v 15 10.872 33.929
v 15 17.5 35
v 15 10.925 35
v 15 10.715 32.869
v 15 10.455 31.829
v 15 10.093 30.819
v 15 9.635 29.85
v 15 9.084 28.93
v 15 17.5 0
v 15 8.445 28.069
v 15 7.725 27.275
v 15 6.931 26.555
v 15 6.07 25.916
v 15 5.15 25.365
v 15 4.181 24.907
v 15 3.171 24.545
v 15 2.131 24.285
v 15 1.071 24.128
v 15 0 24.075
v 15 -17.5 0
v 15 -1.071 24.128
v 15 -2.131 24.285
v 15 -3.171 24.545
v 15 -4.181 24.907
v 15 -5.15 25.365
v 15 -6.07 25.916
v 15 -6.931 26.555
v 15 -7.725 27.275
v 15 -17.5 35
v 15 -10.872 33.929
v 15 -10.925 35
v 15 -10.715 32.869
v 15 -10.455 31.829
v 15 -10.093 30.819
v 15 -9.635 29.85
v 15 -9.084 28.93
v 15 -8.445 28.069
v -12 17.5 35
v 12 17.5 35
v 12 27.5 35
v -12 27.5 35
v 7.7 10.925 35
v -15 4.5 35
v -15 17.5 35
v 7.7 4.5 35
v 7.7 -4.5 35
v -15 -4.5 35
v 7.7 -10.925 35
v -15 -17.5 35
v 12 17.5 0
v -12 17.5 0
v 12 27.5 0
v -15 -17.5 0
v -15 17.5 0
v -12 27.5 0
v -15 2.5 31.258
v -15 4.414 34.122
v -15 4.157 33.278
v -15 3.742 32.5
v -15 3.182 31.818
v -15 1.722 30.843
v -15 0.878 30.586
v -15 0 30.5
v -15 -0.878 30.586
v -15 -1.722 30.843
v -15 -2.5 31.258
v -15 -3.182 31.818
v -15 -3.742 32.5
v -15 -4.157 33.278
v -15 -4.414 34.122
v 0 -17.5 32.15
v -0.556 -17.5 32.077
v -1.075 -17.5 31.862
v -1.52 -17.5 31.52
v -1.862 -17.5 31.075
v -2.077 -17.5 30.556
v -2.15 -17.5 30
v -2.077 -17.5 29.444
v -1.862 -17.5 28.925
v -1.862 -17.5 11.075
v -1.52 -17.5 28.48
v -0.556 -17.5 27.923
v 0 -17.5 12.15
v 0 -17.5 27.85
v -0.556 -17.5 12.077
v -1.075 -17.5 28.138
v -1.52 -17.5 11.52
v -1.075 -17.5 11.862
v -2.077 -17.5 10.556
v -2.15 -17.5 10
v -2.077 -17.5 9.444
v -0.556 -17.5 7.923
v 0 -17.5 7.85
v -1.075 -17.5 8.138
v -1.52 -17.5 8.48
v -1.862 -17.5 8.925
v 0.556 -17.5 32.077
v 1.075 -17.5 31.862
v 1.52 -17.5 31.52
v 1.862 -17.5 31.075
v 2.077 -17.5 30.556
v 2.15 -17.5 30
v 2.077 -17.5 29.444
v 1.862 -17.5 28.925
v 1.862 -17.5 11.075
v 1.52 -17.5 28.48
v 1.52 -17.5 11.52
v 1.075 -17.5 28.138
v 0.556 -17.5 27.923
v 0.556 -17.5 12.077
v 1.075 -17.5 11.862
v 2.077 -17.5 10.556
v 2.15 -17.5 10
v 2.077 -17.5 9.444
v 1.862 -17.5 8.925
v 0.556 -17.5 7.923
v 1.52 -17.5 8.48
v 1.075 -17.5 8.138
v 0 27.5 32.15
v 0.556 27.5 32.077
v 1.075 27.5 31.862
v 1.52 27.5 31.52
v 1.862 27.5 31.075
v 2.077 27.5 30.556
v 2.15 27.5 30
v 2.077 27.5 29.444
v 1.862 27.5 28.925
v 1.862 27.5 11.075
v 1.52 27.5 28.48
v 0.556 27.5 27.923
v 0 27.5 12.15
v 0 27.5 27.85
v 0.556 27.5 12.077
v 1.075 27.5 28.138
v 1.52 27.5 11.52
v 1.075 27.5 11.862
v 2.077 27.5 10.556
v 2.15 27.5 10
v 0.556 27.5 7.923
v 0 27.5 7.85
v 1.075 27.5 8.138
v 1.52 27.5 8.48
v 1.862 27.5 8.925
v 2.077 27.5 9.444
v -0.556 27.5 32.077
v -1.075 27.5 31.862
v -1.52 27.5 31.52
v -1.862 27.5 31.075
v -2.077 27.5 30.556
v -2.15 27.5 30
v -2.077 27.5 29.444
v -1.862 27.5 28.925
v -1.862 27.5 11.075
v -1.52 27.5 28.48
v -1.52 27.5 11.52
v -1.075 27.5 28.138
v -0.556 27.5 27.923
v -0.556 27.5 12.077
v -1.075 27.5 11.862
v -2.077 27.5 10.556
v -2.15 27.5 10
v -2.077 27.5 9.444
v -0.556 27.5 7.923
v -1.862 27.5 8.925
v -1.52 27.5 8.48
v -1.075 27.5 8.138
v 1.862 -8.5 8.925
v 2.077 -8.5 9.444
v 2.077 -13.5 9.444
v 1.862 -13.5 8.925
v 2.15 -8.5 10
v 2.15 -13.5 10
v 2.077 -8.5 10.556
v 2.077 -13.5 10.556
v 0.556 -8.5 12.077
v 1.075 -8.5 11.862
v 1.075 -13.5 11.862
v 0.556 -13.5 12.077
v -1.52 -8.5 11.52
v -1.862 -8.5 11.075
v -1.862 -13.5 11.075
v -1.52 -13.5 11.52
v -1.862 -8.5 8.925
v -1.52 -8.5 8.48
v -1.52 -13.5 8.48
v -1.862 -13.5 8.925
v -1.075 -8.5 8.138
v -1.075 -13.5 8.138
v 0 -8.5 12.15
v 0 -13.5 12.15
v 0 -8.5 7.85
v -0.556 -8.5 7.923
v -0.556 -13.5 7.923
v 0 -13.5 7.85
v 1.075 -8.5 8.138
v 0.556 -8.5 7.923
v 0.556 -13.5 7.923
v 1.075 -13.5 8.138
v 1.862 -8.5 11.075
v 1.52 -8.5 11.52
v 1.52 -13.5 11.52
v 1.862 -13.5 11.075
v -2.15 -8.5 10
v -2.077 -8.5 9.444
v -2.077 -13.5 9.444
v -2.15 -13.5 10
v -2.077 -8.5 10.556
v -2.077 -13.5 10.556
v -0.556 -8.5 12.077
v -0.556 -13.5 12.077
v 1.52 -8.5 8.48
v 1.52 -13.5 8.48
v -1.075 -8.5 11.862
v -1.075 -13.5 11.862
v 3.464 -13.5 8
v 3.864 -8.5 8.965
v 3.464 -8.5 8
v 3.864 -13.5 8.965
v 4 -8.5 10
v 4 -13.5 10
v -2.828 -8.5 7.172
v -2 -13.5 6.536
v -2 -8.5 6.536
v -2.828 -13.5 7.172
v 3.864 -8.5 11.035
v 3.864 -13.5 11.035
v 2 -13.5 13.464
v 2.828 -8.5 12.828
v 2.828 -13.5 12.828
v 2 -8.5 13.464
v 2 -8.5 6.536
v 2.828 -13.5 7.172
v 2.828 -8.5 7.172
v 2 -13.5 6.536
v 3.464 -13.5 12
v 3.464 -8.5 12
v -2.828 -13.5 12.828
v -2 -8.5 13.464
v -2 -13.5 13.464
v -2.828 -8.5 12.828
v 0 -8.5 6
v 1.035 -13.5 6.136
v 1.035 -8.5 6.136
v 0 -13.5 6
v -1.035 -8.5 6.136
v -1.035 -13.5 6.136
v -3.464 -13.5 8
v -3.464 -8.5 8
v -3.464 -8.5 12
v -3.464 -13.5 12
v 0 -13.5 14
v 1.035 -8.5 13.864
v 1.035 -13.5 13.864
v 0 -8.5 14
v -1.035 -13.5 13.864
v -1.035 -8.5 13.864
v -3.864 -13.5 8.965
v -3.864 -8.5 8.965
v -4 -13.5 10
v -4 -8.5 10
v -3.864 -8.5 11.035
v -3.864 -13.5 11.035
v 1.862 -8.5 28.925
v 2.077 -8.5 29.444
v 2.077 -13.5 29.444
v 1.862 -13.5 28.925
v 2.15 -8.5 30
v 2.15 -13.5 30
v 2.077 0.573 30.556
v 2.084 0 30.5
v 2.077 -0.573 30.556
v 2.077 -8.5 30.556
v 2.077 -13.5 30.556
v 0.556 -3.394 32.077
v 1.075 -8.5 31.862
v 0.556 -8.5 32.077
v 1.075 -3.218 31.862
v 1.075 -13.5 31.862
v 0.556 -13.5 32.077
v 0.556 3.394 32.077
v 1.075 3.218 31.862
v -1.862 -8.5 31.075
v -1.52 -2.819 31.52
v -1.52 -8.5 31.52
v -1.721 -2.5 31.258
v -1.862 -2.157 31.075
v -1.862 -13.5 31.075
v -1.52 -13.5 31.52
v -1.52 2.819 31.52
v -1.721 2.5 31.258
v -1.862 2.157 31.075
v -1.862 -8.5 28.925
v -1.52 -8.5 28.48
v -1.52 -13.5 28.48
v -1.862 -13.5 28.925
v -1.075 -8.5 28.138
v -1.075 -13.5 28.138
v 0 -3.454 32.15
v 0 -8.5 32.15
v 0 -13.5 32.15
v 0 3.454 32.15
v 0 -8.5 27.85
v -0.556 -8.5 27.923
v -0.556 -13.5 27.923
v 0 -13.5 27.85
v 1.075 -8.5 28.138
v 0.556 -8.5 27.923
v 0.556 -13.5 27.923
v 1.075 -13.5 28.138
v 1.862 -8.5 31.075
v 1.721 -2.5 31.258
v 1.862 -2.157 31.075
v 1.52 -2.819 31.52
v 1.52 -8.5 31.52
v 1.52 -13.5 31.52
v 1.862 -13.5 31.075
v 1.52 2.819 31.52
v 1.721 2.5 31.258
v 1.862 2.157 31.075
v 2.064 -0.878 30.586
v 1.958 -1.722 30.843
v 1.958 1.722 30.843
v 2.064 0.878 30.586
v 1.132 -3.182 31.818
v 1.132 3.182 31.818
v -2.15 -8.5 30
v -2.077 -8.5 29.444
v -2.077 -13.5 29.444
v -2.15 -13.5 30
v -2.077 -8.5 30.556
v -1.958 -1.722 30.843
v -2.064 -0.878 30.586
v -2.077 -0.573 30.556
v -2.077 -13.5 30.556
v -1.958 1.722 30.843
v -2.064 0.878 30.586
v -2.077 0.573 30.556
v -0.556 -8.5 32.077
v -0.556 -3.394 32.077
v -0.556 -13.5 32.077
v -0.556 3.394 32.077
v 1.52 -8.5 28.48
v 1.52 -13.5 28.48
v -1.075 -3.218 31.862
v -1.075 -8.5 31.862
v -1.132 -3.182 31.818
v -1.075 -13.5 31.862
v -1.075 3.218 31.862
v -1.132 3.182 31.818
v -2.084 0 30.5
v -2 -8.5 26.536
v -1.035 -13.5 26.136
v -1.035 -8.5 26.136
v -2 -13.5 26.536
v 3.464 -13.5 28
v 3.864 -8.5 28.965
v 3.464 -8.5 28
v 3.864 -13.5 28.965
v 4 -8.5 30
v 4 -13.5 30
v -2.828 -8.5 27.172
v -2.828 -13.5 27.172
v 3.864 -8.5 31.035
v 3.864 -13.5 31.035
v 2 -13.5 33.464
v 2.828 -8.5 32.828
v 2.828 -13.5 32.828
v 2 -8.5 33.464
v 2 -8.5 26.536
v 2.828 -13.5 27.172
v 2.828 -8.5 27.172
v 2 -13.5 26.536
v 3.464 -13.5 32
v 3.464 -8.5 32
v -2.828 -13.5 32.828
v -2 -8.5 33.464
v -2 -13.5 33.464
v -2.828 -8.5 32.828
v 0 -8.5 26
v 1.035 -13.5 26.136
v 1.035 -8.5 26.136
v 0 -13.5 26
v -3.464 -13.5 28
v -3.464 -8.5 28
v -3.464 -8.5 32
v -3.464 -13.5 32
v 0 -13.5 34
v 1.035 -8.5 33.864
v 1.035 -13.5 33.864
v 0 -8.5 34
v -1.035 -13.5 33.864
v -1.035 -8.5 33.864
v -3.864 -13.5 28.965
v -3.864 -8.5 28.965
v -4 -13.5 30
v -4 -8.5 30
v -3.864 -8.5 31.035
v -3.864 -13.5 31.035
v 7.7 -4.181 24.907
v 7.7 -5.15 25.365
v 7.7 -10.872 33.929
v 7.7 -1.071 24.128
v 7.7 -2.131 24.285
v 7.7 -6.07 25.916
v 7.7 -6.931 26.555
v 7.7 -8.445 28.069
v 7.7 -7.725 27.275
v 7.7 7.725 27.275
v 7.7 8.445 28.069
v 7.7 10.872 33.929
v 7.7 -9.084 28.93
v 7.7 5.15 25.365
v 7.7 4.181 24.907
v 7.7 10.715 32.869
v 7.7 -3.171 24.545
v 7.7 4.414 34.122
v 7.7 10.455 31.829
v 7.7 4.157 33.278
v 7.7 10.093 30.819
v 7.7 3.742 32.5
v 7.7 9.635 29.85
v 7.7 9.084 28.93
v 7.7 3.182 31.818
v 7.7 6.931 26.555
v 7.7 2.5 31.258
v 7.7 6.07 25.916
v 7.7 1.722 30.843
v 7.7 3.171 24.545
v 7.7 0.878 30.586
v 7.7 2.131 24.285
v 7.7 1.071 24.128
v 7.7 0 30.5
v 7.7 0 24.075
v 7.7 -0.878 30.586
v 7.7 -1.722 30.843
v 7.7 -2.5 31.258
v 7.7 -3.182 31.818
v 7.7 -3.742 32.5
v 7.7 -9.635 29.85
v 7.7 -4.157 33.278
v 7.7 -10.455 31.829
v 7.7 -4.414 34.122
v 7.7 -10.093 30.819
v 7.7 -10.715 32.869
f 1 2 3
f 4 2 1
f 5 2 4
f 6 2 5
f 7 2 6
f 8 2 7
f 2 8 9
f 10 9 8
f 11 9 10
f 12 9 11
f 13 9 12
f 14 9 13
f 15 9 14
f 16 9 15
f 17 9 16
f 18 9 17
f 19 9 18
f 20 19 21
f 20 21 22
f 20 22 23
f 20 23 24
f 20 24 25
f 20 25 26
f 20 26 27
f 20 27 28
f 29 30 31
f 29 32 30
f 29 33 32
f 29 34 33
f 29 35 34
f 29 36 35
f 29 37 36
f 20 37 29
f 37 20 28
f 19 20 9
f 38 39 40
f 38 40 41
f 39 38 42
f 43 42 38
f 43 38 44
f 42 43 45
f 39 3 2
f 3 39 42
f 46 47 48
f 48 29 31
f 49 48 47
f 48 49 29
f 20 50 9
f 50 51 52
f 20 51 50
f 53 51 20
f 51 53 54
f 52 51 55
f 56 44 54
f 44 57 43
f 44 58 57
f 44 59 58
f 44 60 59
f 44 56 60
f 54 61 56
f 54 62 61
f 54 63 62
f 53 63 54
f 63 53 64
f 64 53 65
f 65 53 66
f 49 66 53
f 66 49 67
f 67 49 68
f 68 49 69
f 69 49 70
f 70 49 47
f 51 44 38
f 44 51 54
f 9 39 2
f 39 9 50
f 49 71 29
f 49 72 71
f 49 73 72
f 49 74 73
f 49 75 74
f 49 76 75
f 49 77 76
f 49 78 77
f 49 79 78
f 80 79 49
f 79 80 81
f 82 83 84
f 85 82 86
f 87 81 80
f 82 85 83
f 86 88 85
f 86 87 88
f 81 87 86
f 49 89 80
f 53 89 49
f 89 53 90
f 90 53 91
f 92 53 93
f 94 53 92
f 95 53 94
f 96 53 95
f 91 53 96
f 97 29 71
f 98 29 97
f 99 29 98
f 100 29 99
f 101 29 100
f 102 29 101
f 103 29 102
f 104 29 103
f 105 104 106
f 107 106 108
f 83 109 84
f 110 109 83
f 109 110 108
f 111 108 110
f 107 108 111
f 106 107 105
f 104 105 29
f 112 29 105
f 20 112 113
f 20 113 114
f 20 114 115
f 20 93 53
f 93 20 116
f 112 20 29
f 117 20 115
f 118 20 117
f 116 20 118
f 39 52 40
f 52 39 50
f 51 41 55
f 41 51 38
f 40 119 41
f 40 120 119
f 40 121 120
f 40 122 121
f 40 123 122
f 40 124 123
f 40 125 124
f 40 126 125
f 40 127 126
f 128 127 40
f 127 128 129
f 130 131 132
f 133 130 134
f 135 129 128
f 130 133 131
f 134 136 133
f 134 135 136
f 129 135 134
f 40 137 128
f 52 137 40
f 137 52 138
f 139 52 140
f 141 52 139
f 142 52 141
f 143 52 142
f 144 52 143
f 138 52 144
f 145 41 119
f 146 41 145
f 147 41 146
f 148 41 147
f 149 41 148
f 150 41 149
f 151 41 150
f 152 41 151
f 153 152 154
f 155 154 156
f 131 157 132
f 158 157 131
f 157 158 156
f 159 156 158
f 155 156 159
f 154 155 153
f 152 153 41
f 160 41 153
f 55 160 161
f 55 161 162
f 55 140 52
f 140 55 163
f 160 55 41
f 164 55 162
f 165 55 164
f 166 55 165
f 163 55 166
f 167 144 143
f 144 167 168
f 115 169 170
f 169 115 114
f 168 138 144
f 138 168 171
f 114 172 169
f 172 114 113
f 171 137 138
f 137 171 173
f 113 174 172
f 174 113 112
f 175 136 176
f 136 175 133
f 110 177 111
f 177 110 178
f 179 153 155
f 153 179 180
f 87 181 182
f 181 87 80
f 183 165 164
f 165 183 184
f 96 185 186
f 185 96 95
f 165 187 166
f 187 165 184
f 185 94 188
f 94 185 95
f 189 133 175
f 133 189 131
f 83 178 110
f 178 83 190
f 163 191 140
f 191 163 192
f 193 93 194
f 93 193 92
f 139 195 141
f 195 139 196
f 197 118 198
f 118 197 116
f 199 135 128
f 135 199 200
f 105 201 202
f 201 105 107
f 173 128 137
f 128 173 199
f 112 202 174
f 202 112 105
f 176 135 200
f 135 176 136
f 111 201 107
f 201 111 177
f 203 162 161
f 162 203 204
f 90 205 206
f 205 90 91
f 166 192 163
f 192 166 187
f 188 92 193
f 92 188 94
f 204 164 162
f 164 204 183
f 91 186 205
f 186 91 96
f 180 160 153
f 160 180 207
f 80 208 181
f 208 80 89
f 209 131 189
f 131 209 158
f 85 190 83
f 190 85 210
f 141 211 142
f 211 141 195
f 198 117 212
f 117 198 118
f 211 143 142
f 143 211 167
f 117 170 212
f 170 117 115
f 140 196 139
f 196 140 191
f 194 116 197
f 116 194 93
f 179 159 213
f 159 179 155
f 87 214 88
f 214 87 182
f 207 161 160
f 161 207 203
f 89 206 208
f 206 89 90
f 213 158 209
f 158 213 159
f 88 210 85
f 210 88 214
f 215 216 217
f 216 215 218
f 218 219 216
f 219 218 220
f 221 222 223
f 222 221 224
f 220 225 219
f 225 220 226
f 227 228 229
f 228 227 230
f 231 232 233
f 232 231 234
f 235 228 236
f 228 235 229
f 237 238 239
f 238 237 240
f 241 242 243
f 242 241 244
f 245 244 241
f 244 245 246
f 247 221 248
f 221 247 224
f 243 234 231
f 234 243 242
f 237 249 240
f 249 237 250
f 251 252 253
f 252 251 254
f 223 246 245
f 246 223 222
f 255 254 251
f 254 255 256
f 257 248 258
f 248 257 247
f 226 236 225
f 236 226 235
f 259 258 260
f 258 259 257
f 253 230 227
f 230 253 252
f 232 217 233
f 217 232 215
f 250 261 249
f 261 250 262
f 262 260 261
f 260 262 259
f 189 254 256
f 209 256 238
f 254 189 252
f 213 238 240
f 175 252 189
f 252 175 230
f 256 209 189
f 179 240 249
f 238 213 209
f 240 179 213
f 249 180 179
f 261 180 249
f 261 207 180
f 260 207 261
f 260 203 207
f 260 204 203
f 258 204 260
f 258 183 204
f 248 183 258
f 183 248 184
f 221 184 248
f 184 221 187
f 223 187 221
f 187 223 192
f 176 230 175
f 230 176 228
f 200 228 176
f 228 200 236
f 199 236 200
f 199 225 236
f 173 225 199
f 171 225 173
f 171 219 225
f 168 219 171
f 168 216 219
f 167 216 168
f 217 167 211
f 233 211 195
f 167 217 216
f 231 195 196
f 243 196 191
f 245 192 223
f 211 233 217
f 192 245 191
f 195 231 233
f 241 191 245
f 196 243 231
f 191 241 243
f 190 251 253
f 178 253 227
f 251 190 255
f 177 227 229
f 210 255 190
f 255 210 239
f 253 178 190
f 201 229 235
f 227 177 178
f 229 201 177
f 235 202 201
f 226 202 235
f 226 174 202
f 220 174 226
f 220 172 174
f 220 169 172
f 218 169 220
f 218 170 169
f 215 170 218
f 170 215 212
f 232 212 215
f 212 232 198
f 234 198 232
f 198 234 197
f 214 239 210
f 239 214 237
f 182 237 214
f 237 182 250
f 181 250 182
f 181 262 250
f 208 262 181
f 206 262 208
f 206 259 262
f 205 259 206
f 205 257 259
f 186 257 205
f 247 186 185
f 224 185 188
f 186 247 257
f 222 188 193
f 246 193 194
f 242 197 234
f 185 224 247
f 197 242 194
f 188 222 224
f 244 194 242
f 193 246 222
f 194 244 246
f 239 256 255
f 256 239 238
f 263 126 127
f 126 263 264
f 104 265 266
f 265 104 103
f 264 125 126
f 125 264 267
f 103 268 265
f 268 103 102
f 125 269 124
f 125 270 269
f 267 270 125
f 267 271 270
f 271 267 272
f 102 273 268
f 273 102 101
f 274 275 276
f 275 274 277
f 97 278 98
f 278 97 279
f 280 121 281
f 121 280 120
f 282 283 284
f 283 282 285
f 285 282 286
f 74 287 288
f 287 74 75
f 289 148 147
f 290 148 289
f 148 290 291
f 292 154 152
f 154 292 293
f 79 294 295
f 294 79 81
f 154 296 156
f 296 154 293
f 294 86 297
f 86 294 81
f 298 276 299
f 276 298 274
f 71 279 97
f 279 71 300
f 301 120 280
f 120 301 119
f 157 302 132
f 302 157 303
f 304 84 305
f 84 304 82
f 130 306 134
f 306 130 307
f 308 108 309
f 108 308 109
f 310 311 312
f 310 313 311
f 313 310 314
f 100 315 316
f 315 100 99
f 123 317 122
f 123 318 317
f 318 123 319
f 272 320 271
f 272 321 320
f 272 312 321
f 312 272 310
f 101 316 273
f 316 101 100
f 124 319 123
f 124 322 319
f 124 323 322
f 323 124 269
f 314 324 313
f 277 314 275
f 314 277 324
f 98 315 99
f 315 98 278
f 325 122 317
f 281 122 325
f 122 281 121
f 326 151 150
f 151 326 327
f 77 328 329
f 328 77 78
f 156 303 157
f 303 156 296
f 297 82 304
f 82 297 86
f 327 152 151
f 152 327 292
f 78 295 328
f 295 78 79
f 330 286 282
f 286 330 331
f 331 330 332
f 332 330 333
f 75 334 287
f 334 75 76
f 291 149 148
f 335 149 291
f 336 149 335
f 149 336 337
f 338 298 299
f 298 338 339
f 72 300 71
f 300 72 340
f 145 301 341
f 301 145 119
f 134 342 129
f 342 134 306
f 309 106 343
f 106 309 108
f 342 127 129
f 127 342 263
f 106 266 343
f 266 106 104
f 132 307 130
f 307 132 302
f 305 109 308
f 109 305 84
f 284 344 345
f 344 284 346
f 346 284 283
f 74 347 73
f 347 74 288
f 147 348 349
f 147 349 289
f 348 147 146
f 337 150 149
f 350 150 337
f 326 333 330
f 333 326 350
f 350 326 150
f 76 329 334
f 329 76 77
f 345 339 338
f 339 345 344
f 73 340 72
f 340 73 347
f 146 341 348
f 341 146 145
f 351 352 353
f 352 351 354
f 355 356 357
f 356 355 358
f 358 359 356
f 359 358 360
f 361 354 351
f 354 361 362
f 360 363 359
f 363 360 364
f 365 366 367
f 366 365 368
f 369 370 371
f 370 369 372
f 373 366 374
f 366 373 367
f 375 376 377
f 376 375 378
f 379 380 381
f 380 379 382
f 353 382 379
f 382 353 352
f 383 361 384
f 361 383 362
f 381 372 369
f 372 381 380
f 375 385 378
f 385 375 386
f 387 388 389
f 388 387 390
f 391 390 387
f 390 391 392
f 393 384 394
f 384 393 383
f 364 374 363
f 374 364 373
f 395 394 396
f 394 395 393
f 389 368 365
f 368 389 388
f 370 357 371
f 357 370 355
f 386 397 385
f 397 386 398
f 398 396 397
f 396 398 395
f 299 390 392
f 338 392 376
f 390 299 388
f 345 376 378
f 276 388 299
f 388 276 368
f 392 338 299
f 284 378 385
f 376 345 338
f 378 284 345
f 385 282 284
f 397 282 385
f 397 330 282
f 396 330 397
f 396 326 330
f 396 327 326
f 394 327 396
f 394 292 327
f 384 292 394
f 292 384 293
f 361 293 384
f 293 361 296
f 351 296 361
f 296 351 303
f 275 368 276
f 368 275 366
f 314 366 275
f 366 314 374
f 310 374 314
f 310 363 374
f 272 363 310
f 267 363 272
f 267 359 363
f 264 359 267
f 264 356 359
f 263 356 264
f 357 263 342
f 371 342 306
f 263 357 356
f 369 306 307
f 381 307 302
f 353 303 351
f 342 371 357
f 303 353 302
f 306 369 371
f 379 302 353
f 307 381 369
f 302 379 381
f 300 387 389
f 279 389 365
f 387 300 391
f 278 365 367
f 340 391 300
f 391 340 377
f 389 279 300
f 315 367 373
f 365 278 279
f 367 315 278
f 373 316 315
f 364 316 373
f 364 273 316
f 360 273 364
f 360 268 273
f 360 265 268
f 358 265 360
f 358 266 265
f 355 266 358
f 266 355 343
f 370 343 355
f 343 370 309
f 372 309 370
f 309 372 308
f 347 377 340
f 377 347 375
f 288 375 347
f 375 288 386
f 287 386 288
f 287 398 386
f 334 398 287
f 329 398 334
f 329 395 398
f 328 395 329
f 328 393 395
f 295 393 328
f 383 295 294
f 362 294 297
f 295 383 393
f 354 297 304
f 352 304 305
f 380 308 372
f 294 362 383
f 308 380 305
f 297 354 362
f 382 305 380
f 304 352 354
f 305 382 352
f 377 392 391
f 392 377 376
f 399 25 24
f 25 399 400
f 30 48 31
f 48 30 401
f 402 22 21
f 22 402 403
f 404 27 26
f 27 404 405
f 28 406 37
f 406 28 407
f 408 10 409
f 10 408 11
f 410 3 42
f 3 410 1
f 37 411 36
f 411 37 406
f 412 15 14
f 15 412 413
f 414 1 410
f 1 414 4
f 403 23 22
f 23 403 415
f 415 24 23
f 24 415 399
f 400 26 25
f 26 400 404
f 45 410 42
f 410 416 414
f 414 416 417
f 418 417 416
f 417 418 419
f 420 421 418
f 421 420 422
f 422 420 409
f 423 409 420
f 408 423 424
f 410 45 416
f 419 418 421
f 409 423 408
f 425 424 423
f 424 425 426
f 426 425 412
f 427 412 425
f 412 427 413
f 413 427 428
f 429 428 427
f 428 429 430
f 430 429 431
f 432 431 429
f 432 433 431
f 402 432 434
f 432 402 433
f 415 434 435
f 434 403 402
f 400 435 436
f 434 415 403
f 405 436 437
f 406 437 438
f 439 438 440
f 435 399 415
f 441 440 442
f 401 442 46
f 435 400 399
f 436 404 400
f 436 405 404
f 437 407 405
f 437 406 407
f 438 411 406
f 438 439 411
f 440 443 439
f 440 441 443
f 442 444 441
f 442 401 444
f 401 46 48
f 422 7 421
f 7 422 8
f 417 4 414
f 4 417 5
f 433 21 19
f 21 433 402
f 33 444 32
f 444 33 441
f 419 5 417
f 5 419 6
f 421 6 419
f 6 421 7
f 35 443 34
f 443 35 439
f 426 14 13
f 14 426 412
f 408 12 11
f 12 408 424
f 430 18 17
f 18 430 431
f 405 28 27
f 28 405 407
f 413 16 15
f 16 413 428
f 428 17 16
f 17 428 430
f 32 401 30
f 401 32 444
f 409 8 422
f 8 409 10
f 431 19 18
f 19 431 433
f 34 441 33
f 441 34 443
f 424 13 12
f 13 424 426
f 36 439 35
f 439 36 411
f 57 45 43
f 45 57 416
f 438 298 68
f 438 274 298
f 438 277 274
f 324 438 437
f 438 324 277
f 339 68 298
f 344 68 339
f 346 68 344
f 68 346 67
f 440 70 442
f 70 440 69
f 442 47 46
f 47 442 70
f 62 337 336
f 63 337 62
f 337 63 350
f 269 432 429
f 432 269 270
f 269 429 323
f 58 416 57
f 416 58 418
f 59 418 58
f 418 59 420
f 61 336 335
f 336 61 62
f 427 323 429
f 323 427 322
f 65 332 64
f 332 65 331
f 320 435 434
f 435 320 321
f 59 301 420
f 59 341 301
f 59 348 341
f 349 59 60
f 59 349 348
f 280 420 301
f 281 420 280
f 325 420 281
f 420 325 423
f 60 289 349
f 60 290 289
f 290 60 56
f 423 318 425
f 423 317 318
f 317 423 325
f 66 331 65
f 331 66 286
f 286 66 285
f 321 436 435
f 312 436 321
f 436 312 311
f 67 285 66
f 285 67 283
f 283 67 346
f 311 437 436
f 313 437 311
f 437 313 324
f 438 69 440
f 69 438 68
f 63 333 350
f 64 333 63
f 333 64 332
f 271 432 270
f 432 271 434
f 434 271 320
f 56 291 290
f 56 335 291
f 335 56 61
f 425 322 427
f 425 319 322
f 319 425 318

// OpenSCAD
/*
 * BEARING BLOCK - 608 Bearing Mount
 *
 * Supports the cam shaft at each end.
 * Bearing pocket sized for press-fit of 608 bearing.
 *
 * Print: 2x (identical, mount mirrored)
 * Orientation: Upright
 */

include <../common.scad>

$fn = 48;

// ============================================
// MAIN BEARING BLOCK MODULE
// ============================================

module bearing_block() {
    difference() {
        union() {
            // Main block body
            block_body();

            // Mounting flange (toward backplate)
            mounting_flange();
        }

        // Bearing pocket (press fit)
        bearing_pocket();

        // Shaft through-hole
        shaft_hole();

        // Mounting screw holes
        mounting_holes();
    }
}

// ============================================
// BLOCK BODY
// ============================================

module block_body() {
    translate([-BB_WIDTH/2, -BB_DEPTH/2, 0])
        cube([BB_WIDTH, BB_DEPTH, BB_HEIGHT]);
}

// ============================================
// MOUNTING FLANGE
// ============================================

module mounting_flange() {
    flange_width = BB_WIDTH - 6;
    flange_depth = 12;

    translate([-flange_width/2, BB_DEPTH/2 - 2, 0])
        cube([flange_width, flange_depth, BB_HEIGHT]);
}

// ============================================
// BEARING POCKET (Press Fit)
// ============================================

module bearing_pocket() {
    // Pocket from inward face (toward cam)
    // Press fit: pocket slightly smaller than bearing OD

    translate([BB_WIDTH/2 + 1, 0, BB_HEIGHT])
    rotate([0, -90, 0])
        cylinder(d = BEARING_POCKET_DIA, h = BEARING_POCKET_DEPTH + 1, $fn = 64);
}

// ============================================
// SHAFT THROUGH-HOLE
// ============================================

module shaft_hole() {
    // Clearance hole for shaft
    translate([0, 0, BB_HEIGHT])
    rotate([0, 90, 0])
        cylinder(d = BEARING_608_ID + 1, h = BB_WIDTH + 10, center = true, $fn = 32);
}

// ============================================
// MOUNTING HOLES
// ============================================

module mounting_holes() {
    hole_z_positions = [10, BB_HEIGHT - 5];

    for (z = hole_z_positions) {
        // Through hole from front to back
        translate([0, -BB_DEPTH/2 - 1, z])
        rotate([-90, 0, 0])
            cylinder(d = M4_HOLE, h = BB_DEPTH + 20, $fn = 24);

        // Counterbore on front
        translate([0, -BB_DEPTH/2 + M4_HEAD_H, z])
        rotate([-90, 0, 0])
            cylinder(d = M4_HEAD_DIA + 1, h = M4_HEAD_H + 1, $fn = 24);
    }
}

// ============================================
// RENDER
// ============================================

color(C_BB)
bearing_block();

// Ghost bearing
%translate([BB_WIDTH/2 - BEARING_POCKET_DEPTH + BEARING_608_H/2, 0, BB_HEIGHT])
rotate([0, 90, 0])
difference() {
    cylinder(d = BEARING_608_OD, h = BEARING_608_H, center = true);
    cylinder(d = BEARING_608_ID, h = BEARING_608_H + 1, center = true);
}

// Ghost shaft
%translate([0, 0, BB_HEIGHT])
rotate([0, 90, 0])
    cylinder(d = SHAFT_DIA, h = BB_WIDTH + 40, center = true, $fn = 24);

// ============================================
// VERIFICATION
// ============================================

echo("=== BEARING BLOCK VERIFICATION ===");
echo(str("Size: ", BB_WIDTH, " x ", BB_DEPTH, " x ", BB_HEIGHT, "mm"));
echo(str("Bearing pocket: Ø", BEARING_POCKET_DIA, " x ", BEARING_POCKET_DEPTH, "mm"));
echo(str("Shaft center: Z = ", BB_HEIGHT, "mm"));
echo("");
echo("BEARING FIT:");
echo(str("  Bearing OD: ", BEARING_608_OD, "mm"));
echo(str("  Pocket dia: ", BEARING_POCKET_DIA, "mm"));
echo(str("  Interference: ", BEARING_608_OD - BEARING_POCKET_DIA, "mm (press fit)"));
